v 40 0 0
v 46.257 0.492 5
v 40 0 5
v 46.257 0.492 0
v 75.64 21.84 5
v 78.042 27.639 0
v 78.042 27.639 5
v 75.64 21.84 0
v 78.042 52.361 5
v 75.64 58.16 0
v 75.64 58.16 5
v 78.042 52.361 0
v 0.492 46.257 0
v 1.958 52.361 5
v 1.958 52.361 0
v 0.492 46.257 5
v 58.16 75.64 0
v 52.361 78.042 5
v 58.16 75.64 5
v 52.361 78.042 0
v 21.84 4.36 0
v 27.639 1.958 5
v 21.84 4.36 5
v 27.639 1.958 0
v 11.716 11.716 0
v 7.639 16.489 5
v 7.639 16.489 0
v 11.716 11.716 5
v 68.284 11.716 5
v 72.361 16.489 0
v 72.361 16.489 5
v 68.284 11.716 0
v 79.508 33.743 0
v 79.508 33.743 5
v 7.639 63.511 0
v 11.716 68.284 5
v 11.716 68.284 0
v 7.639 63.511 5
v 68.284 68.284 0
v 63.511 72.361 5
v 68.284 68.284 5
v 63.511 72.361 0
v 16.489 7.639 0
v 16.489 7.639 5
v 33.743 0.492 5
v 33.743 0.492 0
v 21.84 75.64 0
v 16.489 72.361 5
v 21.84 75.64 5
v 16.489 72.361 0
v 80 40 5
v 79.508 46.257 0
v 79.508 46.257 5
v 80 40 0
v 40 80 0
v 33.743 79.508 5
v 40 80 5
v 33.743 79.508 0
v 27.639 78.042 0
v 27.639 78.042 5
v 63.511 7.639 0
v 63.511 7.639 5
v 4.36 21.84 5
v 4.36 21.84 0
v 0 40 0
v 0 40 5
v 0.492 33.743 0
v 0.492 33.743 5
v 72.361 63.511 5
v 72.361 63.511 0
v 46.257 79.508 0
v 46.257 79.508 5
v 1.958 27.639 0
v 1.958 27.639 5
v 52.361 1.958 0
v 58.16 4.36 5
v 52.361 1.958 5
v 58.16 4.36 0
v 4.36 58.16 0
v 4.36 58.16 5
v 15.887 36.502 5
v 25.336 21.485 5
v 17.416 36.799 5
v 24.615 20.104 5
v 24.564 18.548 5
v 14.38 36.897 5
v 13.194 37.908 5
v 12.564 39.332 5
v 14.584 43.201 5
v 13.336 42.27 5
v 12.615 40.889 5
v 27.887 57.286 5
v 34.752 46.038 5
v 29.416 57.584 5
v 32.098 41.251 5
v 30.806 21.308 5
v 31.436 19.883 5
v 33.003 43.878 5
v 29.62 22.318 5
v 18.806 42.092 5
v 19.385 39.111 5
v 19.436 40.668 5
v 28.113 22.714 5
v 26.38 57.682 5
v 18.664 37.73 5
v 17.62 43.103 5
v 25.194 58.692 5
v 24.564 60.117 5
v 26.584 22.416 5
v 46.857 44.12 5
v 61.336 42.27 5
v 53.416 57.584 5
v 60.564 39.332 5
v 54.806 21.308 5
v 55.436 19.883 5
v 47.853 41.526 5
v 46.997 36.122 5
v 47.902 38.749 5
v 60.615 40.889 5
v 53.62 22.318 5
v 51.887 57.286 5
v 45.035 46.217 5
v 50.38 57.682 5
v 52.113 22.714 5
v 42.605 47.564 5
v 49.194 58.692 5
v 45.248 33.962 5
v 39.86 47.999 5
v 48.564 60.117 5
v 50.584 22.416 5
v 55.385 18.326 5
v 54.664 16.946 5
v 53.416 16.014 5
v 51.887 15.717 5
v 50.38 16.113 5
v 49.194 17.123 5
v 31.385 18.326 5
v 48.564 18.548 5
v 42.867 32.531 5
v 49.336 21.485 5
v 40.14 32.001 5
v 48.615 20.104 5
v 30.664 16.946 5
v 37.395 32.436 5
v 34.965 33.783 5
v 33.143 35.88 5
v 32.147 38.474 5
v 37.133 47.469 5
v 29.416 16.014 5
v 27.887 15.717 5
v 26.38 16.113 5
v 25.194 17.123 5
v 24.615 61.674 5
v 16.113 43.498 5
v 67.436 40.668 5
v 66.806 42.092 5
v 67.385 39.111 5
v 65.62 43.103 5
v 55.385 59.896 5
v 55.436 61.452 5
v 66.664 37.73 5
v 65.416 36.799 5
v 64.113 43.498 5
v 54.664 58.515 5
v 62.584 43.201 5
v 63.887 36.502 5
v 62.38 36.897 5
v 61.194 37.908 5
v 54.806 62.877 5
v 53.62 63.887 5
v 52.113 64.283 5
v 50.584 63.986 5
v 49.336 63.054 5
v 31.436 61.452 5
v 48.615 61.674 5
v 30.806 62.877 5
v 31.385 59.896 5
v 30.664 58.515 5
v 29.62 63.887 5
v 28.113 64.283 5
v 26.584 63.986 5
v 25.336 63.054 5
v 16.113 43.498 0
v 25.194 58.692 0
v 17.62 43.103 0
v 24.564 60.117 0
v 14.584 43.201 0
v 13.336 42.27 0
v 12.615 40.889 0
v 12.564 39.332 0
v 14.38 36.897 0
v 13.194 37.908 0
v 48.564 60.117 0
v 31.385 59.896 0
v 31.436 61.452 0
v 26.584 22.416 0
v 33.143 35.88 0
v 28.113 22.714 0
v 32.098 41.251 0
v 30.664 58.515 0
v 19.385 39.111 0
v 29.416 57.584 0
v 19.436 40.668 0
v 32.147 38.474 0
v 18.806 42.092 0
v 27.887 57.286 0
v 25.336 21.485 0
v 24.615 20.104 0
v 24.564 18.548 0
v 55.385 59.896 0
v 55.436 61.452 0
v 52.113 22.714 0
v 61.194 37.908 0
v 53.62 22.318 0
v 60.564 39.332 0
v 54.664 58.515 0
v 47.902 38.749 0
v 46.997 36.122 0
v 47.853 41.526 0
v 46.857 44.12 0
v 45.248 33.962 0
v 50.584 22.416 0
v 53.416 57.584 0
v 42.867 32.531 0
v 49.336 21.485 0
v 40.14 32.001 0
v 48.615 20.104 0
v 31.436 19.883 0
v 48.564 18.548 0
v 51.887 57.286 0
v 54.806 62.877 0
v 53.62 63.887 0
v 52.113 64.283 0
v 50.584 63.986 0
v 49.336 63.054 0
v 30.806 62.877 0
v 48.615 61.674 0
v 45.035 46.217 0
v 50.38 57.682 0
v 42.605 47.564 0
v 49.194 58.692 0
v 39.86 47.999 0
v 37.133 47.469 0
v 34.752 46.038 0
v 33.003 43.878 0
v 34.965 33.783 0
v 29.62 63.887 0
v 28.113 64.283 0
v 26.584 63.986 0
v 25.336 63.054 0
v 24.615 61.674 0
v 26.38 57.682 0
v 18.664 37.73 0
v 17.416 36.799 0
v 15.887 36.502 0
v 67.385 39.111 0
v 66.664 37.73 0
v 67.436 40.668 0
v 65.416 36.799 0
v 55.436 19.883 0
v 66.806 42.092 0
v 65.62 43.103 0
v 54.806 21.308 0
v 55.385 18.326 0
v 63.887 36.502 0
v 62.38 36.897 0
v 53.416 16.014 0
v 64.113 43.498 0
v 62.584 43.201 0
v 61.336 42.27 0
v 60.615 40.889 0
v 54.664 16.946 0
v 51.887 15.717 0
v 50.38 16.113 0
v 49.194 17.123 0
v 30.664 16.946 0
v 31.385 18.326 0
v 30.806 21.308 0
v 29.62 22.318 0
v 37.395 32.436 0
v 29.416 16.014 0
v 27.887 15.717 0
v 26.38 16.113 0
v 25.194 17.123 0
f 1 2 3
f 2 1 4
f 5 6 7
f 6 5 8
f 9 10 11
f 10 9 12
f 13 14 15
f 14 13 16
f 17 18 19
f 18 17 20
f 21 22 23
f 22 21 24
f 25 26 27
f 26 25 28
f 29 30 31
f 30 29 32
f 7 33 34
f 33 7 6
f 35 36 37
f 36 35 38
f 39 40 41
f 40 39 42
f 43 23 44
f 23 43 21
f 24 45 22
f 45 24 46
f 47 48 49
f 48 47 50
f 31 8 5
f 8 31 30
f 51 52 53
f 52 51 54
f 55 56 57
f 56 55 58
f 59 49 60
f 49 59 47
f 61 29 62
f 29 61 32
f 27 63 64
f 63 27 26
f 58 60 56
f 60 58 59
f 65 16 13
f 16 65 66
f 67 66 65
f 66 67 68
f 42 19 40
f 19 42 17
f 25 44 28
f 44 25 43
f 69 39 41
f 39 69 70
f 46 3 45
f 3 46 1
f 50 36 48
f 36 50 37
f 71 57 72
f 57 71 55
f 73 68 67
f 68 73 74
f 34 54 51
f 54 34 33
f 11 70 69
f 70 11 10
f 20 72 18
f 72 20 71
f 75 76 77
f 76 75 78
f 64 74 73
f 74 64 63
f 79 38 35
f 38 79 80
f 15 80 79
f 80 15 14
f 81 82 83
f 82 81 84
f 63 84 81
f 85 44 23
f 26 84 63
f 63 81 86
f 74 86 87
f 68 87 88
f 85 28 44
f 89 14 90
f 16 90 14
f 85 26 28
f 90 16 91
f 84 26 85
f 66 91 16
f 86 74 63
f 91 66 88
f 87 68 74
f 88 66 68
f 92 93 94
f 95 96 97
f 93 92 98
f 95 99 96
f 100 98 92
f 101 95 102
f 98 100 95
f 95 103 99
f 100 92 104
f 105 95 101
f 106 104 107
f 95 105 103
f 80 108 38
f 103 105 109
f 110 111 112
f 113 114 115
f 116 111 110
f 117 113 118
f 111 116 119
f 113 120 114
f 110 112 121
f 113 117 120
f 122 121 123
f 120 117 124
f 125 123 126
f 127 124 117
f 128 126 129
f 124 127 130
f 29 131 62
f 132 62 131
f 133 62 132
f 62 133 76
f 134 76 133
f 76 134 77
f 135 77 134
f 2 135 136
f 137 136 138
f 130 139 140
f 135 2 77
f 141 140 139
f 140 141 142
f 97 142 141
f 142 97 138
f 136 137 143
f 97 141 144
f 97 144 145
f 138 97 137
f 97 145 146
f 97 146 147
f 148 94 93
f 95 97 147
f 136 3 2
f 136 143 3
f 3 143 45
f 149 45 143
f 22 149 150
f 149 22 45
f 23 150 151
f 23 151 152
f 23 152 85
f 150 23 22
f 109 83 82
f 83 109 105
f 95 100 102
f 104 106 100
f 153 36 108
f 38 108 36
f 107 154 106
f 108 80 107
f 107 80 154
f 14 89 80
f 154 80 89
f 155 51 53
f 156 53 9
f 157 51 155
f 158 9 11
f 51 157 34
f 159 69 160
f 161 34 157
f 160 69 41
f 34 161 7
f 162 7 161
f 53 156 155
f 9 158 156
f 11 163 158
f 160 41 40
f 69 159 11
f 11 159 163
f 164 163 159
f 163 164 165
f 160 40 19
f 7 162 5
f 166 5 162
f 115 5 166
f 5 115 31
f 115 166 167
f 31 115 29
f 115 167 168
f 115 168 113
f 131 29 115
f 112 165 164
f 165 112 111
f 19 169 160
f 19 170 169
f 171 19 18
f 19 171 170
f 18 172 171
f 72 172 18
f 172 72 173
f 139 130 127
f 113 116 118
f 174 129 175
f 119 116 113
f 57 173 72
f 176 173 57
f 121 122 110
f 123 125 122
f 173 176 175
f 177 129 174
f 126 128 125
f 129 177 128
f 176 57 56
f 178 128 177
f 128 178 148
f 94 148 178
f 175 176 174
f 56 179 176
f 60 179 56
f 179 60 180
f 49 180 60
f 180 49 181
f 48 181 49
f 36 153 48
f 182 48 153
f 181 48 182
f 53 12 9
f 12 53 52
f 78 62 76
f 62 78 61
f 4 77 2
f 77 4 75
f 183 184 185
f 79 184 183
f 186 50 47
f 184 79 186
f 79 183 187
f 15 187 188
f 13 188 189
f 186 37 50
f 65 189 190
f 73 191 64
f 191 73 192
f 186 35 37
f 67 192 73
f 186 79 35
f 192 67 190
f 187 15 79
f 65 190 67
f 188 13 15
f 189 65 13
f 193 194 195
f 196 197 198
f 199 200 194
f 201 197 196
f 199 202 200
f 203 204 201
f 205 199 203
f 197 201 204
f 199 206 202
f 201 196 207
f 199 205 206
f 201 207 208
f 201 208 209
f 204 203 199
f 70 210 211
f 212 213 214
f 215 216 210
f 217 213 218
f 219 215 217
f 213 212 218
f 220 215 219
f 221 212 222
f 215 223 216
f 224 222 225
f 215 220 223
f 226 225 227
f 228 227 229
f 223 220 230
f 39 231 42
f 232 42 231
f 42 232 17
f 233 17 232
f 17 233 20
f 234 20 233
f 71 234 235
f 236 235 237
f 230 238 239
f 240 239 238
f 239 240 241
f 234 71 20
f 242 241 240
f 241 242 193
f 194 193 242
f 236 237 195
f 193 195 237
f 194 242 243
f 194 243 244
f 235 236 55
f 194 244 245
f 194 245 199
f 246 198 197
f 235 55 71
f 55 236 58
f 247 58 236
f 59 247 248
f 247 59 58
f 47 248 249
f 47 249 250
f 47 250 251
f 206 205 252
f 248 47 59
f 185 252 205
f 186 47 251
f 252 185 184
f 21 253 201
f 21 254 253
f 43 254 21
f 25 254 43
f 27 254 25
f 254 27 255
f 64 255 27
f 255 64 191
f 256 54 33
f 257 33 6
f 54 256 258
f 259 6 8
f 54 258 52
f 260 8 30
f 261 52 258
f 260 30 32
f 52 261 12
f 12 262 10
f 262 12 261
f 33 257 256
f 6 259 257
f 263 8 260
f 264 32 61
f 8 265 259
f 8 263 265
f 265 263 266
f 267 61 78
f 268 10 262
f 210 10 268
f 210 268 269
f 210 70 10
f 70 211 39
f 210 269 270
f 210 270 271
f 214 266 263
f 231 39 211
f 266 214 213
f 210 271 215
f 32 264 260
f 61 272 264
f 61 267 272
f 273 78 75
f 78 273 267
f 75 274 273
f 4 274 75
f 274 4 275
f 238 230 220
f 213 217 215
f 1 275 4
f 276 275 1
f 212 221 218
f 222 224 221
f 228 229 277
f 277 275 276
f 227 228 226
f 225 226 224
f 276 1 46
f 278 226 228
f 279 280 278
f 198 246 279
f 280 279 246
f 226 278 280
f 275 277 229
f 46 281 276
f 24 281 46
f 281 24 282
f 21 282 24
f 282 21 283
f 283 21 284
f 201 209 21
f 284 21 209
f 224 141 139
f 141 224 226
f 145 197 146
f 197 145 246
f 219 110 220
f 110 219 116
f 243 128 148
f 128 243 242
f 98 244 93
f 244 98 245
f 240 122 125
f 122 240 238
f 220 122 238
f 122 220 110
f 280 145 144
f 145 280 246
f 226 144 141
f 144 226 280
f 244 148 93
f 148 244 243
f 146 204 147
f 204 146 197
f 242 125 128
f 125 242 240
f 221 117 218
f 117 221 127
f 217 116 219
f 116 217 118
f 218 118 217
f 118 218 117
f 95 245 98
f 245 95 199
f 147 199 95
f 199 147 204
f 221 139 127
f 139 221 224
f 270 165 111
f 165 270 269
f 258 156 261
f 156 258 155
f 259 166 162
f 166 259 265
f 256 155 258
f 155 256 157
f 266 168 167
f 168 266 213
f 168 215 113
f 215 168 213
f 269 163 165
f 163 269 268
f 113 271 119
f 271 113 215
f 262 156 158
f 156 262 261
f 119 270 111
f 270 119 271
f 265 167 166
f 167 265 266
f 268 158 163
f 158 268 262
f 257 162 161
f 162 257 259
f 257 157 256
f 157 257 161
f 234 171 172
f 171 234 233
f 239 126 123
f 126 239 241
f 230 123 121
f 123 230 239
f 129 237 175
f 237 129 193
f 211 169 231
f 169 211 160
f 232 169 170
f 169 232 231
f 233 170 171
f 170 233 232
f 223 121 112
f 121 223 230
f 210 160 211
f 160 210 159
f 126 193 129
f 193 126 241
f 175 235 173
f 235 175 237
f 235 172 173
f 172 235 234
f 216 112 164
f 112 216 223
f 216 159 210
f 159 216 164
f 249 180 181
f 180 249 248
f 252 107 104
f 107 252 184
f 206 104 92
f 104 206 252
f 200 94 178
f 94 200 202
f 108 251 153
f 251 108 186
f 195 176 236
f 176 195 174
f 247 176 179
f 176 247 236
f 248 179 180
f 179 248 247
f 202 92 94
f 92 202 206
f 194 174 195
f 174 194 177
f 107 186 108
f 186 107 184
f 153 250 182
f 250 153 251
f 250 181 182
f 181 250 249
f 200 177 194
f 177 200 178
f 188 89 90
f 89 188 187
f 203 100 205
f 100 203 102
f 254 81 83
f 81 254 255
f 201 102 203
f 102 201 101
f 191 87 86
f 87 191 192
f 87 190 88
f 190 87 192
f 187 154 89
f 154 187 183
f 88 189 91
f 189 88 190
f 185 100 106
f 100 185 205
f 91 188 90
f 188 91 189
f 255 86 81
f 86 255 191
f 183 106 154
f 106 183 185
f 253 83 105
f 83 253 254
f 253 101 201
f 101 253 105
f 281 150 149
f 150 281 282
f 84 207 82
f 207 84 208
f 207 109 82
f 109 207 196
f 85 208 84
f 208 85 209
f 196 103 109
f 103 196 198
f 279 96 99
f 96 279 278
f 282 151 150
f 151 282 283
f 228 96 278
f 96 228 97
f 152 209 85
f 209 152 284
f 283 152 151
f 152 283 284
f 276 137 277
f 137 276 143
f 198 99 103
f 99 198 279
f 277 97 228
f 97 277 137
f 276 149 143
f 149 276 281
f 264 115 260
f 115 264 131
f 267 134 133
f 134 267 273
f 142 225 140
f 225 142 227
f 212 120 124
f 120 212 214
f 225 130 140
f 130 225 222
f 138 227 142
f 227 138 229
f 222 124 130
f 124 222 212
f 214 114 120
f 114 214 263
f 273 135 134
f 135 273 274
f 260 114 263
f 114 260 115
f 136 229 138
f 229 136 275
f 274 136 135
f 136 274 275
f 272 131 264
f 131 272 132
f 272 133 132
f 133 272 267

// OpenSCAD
$fn = 32;

// ----------------------------------------------------------------------
// Spacer plate: round flange R40, 6 bolts
// ----------------------------------------------------------------------

// --- parameters (mm) ---
bore_r = 8;               // centre bore radius
bolt_r = 3.5;             // bolt hole radius
plate_t = 5;              // plate thickness, Z (extrusion height)
flange_r = 40;            // flange radius
n_bolt = 6;               // bolt hole count
ring_r = 24;              // bolt circle radius

profile = [[80, 40], [79.508, 46.257], [78.042, 52.361], [75.64, 58.16], [72.361, 63.511], [68.284, 68.284], [63.511, 72.361], [58.16, 75.64], [52.361, 78.042], [46.257, 79.508], [40, 80], [33.743, 79.508], [27.639, 78.042], [21.84, 75.64], [16.489, 72.361], [11.716, 68.284], [7.639, 63.511], [4.36, 58.16], [1.958, 52.361], [0.492, 46.257], [0, 40], [0.492, 33.743], [1.958, 27.639], [4.36, 21.84], [7.639, 16.489], [11.716, 11.716], [16.489, 7.639], [21.84, 4.36], [27.639, 1.958], [33.743, 0.492], [40, 0], [46.257, 0.492], [52.361, 1.958], [58.16, 4.36], [63.511, 7.639], [68.284, 11.716], [72.361, 16.489], [75.64, 21.84], [78.042, 27.639], [79.508, 33.743]];  // primary outline, 40 points, counter clockwise
void_1 = [[47.853, 41.526], [46.857, 44.12], [45.035, 46.217], [42.605, 47.564], [39.86, 47.999], [37.133, 47.469], [34.752, 46.038], [33.003, 43.878], [32.098, 41.251], [32.147, 38.474], [33.143, 35.88], [34.965, 33.783], [37.395, 32.436], [40.14, 32.001], [42.867, 32.531], [45.248, 33.962], [46.997, 36.122], [47.902, 38.749]];  // centre bore, 18 points
void_2 = [[67.436, 40.668], [66.806, 42.092], [65.62, 43.103], [64.113, 43.498], [62.584, 43.201], [61.336, 42.27], [60.615, 40.889], [60.564, 39.332], [61.194, 37.908], [62.38, 36.897], [63.887, 36.502], [65.416, 36.799], [66.664, 37.73], [67.385, 39.111]];  // bolt hole 1, 14 points
void_3 = [[55.436, 61.452], [54.806, 62.877], [53.62, 63.887], [52.113, 64.283], [50.584, 63.986], [49.336, 63.054], [48.615, 61.674], [48.564, 60.117], [49.194, 58.692], [50.38, 57.682], [51.887, 57.286], [53.416, 57.584], [54.664, 58.515], [55.385, 59.896]];  // bolt hole 2, 14 points
void_4 = [[31.436, 61.452], [30.806, 62.877], [29.62, 63.887], [28.113, 64.283], [26.584, 63.986], [25.336, 63.054], [24.615, 61.674], [24.564, 60.117], [25.194, 58.692], [26.38, 57.682], [27.887, 57.286], [29.416, 57.584], [30.664, 58.515], [31.385, 59.896]];  // bolt hole 3, 14 points
void_5 = [[19.436, 40.668], [18.806, 42.092], [17.62, 43.103], [16.113, 43.498], [14.584, 43.201], [13.336, 42.27], [12.615, 40.889], [12.564, 39.332], [13.194, 37.908], [14.38, 36.897], [15.887, 36.502], [17.416, 36.799], [18.664, 37.73], [19.385, 39.111]];  // bolt hole 4, 14 points
void_6 = [[31.436, 19.883], [30.806, 21.308], [29.62, 22.318], [28.113, 22.714], [26.584, 22.416], [25.336, 21.485], [24.615, 20.104], [24.564, 18.548], [25.194, 17.123], [26.38, 16.113], [27.887, 15.717], [29.416, 16.014], [30.664, 16.946], [31.385, 18.326]];  // bolt hole 5, 14 points
void_7 = [[55.436, 19.883], [54.806, 21.308], [53.62, 22.318], [52.113, 22.714], [50.584, 22.416], [49.336, 21.485], [48.615, 20.104], [48.564, 18.548], [49.194, 17.123], [50.38, 16.113], [51.887, 15.717], [53.416, 16.014], [54.664, 16.946], [55.385, 18.326]];  // bolt hole 6, 14 points

// --- the one profile operation ---
difference() {
  linear_extrude(height = plate_t) polygon(points = profile);
  translate([0, 0, -1])
    linear_extrude(height = plate_t + 2) polygon(points = void_1);
  translate([0, 0, -1])
    linear_extrude(height = plate_t + 2) polygon(points = void_2);
  translate([0, 0, -1])
    linear_extrude(height = plate_t + 2) polygon(points = void_3);
  translate([0, 0, -1])
    linear_extrude(height = plate_t + 2) polygon(points = void_4);
  translate([0, 0, -1])
    linear_extrude(height = plate_t + 2) polygon(points = void_5);
  translate([0, 0, -1])
    linear_extrude(height = plate_t + 2) polygon(points = void_6);
  translate([0, 0, -1])
    linear_extrude(height = plate_t + 2) polygon(points = void_7);
}
